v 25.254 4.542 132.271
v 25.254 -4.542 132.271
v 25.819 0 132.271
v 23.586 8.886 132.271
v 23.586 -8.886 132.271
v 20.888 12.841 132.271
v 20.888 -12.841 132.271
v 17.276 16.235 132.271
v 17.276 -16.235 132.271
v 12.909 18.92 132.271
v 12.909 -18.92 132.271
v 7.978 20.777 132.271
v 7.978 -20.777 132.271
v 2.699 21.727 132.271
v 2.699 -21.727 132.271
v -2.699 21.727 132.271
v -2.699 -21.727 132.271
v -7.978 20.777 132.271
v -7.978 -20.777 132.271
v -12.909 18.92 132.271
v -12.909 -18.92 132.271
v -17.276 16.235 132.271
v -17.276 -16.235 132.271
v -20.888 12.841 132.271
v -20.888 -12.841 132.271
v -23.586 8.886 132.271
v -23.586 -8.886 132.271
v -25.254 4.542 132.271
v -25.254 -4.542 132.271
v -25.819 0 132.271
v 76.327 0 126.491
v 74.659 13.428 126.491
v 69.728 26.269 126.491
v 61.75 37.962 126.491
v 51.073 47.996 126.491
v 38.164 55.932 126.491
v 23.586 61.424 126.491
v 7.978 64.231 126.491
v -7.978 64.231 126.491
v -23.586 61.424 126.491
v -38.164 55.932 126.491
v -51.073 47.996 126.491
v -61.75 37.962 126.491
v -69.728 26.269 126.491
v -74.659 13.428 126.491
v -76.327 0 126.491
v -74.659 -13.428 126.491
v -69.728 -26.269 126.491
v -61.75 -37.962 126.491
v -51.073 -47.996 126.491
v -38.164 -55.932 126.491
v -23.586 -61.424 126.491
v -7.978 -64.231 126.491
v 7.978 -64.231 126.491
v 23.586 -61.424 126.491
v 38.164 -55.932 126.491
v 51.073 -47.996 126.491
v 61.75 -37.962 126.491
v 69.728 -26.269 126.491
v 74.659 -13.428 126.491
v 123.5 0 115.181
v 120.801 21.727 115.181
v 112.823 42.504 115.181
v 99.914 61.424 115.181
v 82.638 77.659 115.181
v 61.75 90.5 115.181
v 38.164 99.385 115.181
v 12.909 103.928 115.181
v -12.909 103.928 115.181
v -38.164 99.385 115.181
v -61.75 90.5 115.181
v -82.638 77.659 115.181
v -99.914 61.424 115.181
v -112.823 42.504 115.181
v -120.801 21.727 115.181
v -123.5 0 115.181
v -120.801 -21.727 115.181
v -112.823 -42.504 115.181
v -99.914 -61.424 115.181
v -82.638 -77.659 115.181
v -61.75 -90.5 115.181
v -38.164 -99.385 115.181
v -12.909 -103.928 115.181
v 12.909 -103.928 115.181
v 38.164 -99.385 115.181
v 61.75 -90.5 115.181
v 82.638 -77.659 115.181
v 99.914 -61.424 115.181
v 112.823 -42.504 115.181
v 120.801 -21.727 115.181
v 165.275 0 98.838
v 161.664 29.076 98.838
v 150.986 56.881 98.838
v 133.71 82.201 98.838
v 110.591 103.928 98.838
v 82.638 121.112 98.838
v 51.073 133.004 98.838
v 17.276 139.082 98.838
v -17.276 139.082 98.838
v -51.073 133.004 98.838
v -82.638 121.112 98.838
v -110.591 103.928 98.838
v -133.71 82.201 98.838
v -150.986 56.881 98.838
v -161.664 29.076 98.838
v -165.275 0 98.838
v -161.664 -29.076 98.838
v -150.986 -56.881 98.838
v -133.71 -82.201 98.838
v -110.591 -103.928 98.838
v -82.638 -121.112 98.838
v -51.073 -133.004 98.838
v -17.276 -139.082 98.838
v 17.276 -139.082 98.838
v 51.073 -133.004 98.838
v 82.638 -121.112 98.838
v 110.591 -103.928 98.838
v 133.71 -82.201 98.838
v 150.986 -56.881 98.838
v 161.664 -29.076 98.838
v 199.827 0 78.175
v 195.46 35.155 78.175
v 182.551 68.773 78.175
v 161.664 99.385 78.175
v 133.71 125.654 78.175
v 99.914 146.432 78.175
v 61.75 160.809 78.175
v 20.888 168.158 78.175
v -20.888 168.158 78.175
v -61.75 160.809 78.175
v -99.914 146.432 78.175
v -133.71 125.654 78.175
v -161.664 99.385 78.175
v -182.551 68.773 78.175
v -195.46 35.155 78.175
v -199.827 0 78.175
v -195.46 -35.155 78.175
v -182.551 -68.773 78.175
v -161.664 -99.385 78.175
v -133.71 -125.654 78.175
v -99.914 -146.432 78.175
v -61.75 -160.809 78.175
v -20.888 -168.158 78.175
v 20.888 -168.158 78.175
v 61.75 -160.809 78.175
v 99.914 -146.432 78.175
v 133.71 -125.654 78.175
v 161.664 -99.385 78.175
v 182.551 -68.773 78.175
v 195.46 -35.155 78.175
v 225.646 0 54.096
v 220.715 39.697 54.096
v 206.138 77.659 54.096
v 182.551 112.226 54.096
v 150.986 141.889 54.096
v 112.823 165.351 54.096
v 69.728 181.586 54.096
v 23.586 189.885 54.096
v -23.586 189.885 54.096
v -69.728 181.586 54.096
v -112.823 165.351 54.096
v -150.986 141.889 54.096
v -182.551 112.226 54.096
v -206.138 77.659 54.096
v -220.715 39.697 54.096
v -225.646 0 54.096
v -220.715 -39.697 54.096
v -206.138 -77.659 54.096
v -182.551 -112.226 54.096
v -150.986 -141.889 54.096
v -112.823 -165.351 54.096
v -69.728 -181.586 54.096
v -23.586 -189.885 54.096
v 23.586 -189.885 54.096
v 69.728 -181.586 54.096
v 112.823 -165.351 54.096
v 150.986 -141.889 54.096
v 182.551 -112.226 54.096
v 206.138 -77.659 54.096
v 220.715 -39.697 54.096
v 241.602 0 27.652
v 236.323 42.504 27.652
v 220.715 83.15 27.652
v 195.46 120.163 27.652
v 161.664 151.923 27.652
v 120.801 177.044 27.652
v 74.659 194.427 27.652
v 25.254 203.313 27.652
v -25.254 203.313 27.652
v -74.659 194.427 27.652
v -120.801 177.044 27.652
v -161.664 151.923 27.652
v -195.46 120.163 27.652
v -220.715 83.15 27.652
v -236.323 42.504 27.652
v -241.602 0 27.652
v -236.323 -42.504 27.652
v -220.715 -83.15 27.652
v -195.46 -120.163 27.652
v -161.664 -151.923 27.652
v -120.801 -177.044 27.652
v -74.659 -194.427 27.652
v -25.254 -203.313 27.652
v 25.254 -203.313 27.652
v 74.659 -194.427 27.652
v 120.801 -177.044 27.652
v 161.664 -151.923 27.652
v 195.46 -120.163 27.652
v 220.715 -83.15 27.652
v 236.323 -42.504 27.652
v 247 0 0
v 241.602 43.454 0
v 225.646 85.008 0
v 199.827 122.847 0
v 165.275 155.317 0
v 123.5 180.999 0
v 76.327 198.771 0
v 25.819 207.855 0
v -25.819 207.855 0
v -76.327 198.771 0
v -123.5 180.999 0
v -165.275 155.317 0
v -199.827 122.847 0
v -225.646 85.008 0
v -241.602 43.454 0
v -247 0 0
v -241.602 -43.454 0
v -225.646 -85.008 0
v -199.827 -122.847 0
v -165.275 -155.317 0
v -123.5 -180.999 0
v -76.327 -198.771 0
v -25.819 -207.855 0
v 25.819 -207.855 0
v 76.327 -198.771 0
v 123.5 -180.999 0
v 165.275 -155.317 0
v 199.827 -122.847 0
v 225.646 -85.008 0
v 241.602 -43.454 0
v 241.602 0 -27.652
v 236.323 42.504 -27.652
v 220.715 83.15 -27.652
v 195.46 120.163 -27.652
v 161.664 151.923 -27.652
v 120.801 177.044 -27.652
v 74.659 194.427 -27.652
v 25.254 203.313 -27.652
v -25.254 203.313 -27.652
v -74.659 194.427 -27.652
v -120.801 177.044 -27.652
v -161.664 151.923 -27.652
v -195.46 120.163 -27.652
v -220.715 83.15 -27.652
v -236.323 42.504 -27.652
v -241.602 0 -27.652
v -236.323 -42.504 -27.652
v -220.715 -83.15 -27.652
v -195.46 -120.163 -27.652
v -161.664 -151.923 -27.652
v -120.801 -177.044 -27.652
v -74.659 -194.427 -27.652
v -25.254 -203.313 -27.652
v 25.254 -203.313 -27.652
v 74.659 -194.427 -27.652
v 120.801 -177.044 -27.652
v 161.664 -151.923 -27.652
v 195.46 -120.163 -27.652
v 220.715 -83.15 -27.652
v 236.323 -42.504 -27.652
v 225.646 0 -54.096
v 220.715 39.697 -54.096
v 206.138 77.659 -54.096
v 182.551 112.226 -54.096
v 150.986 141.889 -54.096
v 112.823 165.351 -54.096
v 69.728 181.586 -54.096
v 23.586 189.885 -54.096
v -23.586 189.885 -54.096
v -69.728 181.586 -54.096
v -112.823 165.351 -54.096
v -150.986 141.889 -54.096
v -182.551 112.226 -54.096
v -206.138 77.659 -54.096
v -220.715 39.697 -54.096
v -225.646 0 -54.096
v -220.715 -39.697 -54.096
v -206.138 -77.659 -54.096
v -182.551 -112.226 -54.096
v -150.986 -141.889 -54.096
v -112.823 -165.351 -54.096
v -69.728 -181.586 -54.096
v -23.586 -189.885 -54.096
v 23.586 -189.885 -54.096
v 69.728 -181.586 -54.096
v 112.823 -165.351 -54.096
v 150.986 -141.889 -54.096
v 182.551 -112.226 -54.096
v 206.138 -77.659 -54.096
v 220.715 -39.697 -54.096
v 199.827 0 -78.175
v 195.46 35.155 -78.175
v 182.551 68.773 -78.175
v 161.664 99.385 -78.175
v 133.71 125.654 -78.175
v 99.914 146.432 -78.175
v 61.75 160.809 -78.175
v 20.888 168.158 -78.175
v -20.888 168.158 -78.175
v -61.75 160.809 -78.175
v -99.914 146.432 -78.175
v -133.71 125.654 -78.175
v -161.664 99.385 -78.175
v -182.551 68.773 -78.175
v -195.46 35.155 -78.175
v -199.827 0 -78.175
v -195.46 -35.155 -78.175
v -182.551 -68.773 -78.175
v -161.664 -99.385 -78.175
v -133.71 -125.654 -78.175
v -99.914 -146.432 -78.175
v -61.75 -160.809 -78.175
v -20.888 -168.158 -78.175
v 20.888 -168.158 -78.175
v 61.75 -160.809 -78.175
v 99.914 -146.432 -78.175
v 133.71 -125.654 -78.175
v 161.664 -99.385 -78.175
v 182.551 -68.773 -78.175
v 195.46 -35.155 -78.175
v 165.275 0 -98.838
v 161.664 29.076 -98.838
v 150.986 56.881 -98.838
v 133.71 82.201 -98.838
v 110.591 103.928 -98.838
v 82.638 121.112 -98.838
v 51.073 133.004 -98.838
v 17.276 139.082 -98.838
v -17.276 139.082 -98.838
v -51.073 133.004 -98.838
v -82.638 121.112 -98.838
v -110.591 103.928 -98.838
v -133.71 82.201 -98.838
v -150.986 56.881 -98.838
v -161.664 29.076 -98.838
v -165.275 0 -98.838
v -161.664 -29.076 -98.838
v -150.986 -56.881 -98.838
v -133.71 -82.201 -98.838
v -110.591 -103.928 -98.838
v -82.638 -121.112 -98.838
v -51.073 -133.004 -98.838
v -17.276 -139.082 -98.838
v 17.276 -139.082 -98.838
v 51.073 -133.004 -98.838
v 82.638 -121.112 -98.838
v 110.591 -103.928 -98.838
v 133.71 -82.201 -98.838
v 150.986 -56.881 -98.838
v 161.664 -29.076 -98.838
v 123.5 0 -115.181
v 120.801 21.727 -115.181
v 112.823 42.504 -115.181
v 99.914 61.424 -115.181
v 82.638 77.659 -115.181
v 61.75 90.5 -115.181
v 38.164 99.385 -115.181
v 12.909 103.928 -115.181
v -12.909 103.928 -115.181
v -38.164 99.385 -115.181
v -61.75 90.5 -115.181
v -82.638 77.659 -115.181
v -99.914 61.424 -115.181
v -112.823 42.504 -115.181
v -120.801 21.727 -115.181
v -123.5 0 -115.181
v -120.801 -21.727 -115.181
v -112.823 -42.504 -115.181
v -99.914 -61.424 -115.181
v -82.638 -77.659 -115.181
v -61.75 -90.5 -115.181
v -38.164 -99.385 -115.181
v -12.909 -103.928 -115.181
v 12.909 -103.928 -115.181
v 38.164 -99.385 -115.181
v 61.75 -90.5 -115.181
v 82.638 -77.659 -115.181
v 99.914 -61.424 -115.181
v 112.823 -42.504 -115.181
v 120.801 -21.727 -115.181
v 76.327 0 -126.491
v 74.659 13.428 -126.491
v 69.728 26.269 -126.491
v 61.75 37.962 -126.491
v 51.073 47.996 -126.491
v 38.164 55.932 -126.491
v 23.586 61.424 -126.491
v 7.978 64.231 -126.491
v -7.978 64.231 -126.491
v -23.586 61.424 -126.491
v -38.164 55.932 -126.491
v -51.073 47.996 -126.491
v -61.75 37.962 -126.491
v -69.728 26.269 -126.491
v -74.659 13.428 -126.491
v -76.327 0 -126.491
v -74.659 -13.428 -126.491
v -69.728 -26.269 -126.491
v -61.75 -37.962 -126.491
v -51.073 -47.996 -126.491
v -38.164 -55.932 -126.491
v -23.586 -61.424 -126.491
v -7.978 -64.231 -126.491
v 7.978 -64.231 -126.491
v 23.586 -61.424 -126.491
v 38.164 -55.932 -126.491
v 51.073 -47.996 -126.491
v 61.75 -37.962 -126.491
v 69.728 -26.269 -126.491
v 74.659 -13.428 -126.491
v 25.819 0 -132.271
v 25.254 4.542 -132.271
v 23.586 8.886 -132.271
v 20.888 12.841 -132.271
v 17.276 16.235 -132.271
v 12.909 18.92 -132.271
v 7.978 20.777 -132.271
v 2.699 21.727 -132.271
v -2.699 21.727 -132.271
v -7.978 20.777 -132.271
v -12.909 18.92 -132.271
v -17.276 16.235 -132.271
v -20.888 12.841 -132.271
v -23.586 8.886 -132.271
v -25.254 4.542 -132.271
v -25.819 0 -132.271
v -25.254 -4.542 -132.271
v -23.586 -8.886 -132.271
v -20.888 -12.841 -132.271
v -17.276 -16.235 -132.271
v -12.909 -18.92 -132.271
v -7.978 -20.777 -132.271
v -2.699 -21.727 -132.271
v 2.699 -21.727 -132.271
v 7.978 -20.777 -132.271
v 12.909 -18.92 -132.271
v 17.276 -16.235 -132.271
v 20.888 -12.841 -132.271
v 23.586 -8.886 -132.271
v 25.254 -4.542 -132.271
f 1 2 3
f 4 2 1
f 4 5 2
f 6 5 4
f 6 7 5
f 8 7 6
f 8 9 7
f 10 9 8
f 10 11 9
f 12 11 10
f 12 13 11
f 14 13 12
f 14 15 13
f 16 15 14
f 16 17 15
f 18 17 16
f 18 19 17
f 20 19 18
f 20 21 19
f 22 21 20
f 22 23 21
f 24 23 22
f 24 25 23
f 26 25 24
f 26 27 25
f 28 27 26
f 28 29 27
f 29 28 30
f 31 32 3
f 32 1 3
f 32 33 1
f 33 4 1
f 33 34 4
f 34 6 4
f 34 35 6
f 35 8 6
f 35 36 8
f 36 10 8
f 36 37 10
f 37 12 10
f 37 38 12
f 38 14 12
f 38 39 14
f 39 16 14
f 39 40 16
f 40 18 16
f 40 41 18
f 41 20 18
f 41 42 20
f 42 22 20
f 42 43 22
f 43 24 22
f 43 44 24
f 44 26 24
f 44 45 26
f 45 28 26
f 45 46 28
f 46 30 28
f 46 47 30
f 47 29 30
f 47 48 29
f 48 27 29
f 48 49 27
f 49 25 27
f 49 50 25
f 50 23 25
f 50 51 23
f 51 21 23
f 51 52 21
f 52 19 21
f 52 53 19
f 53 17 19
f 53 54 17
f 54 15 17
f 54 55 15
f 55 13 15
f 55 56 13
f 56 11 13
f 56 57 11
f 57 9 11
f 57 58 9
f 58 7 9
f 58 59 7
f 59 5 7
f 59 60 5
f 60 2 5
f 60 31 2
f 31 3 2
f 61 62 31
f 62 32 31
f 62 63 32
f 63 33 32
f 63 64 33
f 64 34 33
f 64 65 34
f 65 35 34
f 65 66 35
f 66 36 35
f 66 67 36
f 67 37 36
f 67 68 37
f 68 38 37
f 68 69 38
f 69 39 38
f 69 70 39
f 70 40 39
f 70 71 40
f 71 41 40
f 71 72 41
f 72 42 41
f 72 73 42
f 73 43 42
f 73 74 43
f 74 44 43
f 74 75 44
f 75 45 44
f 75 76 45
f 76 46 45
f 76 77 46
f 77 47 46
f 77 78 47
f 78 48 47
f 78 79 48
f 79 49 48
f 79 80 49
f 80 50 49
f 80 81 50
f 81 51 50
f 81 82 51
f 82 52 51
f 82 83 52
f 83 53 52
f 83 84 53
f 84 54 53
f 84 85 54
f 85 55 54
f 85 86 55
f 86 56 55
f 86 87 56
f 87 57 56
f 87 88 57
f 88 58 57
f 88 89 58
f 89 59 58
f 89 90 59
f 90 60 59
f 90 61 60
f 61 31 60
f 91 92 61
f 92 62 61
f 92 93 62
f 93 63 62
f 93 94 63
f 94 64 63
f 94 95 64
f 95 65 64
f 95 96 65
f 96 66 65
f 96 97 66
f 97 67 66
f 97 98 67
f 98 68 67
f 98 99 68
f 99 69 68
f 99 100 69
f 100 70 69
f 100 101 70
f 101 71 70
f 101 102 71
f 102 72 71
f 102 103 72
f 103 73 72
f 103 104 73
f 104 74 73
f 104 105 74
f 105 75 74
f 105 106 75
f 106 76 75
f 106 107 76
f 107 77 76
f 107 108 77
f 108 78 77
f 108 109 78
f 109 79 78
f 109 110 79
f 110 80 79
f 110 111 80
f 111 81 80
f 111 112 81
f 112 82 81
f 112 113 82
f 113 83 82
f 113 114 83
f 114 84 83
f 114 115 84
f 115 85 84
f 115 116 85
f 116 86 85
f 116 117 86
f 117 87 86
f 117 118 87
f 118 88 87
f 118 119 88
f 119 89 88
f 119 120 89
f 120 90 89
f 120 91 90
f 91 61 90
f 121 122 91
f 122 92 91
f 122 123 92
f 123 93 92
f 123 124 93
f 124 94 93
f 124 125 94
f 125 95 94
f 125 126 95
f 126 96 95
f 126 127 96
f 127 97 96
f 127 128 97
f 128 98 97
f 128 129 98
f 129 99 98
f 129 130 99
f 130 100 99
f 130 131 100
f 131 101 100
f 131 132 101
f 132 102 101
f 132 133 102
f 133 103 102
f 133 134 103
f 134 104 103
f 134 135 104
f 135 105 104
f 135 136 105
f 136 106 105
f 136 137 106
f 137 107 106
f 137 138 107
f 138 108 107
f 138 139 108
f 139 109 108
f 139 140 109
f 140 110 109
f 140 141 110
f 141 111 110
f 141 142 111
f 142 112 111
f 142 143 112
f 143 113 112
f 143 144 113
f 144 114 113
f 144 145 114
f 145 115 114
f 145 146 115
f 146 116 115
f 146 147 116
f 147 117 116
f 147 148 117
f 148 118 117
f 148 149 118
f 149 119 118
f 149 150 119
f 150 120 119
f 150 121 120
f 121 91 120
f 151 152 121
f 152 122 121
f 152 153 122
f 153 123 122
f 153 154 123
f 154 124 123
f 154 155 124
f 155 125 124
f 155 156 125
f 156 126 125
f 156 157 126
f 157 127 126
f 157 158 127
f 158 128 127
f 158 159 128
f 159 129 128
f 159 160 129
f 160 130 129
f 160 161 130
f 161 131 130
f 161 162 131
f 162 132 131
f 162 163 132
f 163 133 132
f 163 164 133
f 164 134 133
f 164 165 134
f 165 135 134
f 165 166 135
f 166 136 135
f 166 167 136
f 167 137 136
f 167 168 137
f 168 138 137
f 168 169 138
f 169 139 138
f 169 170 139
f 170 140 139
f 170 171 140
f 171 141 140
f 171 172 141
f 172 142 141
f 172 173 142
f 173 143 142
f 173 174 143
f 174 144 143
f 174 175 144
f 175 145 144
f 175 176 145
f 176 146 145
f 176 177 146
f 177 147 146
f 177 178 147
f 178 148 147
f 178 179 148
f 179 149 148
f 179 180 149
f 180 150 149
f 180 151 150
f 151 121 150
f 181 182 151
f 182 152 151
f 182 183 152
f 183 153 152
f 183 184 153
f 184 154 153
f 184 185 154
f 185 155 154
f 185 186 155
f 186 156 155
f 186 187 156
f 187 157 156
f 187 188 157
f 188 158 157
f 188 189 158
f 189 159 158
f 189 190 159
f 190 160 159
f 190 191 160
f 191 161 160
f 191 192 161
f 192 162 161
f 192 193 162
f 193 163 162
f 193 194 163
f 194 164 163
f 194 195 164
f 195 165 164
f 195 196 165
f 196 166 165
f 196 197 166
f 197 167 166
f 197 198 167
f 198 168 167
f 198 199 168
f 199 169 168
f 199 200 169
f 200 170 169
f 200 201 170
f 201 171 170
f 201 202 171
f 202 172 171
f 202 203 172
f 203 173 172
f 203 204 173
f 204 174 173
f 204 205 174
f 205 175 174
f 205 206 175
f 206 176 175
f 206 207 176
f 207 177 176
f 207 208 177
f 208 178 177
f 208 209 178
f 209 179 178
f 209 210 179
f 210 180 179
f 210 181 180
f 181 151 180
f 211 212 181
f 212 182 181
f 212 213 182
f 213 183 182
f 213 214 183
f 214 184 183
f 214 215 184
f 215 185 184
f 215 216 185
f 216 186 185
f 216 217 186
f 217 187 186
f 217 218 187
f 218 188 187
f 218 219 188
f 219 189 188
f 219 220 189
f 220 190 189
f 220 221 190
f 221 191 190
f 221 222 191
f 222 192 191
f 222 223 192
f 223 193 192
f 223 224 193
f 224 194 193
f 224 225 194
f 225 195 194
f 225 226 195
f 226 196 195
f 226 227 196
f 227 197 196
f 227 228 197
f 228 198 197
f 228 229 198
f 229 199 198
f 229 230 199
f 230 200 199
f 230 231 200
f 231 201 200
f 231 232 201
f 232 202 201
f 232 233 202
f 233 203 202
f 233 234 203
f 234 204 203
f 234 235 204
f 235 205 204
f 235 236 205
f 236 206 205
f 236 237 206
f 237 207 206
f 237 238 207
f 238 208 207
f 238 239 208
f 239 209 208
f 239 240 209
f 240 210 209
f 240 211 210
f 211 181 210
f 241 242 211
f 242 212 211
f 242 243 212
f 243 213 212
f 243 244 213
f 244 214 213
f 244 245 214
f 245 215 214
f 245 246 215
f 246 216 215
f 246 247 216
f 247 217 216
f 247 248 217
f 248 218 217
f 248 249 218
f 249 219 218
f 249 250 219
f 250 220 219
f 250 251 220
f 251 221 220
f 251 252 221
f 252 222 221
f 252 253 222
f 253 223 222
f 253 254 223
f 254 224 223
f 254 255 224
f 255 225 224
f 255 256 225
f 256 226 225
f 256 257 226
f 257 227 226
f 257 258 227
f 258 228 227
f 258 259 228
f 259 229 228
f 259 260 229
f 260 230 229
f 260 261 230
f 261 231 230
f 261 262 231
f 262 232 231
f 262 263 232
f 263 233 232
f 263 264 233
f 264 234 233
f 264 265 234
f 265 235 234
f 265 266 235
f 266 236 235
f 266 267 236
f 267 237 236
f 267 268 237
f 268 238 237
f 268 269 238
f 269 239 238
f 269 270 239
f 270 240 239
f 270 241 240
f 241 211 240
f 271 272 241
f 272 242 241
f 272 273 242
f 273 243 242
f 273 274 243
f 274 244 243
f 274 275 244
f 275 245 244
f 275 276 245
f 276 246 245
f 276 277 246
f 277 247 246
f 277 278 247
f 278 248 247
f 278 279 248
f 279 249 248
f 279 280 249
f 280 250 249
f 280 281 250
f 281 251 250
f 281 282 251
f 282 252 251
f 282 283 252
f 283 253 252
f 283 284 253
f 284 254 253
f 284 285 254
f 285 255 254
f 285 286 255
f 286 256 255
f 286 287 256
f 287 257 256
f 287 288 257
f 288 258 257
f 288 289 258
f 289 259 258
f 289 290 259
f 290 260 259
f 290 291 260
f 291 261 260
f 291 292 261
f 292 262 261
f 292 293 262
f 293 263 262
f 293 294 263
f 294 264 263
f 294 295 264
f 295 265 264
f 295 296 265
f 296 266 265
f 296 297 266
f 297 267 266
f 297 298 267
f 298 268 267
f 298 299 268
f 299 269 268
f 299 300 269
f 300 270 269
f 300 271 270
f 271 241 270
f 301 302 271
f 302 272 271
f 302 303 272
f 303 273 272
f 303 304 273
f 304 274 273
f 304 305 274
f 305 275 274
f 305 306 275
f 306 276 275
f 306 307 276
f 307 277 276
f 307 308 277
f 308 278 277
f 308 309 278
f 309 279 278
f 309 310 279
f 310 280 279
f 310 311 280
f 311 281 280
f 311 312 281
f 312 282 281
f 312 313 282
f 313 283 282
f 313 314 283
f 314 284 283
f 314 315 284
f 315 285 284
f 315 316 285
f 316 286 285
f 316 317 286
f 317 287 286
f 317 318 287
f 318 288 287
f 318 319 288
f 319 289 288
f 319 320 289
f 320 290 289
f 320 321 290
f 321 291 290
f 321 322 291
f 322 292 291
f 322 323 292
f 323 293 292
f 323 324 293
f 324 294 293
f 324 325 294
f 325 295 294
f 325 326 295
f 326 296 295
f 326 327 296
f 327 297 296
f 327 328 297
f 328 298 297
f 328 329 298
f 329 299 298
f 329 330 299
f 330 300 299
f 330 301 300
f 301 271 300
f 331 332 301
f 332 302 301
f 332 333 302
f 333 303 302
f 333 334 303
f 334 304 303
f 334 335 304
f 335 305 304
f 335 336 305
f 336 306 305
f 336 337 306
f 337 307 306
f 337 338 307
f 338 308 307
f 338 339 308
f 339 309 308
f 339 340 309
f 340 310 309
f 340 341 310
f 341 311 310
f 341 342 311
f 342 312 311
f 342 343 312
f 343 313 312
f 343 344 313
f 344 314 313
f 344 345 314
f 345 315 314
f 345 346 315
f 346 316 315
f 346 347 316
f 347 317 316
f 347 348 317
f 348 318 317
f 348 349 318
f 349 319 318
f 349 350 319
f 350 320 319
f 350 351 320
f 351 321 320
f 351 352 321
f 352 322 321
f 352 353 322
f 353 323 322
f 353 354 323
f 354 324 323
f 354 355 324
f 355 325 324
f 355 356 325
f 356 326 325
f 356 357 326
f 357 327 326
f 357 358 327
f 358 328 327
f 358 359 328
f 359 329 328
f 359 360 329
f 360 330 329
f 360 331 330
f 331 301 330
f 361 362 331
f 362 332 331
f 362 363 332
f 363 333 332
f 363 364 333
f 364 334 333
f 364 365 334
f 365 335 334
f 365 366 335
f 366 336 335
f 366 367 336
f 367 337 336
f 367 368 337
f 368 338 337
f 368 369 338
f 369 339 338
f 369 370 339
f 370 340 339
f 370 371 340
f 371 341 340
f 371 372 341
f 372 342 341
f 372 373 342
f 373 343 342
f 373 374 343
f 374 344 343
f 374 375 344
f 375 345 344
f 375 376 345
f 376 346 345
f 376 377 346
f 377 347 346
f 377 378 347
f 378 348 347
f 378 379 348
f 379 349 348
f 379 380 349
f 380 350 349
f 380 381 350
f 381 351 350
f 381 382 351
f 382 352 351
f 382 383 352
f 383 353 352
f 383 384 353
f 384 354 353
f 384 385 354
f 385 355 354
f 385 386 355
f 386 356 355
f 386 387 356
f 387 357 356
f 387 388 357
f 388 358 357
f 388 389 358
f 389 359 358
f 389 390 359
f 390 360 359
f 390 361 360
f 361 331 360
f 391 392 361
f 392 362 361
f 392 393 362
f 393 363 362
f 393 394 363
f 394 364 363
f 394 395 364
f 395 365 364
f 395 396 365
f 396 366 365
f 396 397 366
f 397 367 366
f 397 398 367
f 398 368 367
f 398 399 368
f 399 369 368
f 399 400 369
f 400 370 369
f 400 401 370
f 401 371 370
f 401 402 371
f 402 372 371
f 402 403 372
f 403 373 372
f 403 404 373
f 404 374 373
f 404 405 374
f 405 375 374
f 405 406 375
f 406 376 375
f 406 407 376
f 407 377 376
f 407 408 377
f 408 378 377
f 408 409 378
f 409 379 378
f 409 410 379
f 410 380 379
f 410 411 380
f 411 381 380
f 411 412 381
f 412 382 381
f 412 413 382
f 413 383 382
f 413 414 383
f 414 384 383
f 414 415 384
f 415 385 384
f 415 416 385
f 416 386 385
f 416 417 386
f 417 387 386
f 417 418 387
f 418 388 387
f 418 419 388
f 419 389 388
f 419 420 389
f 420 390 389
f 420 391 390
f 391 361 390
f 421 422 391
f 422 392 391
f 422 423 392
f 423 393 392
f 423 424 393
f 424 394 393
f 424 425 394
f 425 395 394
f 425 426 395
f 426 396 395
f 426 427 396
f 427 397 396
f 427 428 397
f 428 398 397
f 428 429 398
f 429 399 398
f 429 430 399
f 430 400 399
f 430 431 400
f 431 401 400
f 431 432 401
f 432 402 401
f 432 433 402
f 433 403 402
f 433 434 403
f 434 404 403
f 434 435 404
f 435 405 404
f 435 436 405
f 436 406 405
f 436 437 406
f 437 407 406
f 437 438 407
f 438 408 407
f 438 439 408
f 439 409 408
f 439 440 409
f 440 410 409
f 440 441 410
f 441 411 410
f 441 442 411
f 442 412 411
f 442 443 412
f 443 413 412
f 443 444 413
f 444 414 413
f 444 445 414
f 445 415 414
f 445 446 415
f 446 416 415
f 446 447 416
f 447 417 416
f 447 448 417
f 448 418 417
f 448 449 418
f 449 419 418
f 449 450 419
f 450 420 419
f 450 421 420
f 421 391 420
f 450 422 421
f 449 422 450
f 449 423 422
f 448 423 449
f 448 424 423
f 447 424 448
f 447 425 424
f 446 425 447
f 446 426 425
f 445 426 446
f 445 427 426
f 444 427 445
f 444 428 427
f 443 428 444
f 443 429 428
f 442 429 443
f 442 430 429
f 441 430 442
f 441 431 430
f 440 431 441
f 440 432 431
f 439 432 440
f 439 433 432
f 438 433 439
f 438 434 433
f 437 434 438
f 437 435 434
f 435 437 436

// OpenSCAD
// Generated by SolidPython 1.0.1 on 2020-07-29 00:46:50


scale(v = [13, 11, 7]) {
	sphere(r = 19);
}
/***********************************************
*********      SolidPython code:      **********
************************************************
 
# import packages: SolidPython
from solid import *
from solid.utils import *
from itertools import chain, combinations, permutations


class Resize:

    def __init__(self, scad_file):
        self.scad_file = scad_file
        #self.scad_file = import_scad(scad_file)
        # cone/cylinder param:
        self.r1 = 0
        self.r2 = 0
        self.h = 0
        # rectangular prism param:
        self.w = 0
        self.l = 0
        # ellipse param:
        self.r = 0

    # import OpenScad code (file name corresponds to shape)


    # classify shape + parameters
    def assign(self, param1, param2, param3):
        if self.scad_file == 'cone.scad':
            self.r1 = param1
            self.r2 = param2
            self.h = param3
        elif self.scad_file == 'cylinder.scad':
            self.r1 = param1
            self.r2 = param2
            self.h = param3
        elif self.scad_file == 'rectangularPrism.scad':
            self.h = param1
            self.l = param2
            self.w = param3
        else:
            self.r = param1
            self.h = param2

    # resize parameters
    def iterate(self):
        x = range(3, 20, 2)
        i = 1
        if self.scad_file == 'cone.scad':
            tempList = list(permutations(x, 2))
            for temp in tempList:
                param1 = temp[0]
                param2 = temp[1]
                filepath = 'produced_scad_files/' + 'cone' + str(param1) + '_' + str(param2) + '_' + '.scad'
                scad_render_to_file(cylinder(h=param1, r1=param2, r2=0), filepath)

        elif self.scad_file == 'cylinder.scad':
            tempList = list(permutations(x, 3))
            for temp in tempList:
                param1 = temp[0]
                param2 = temp[1]
                filepath = 'produced_scad_files/' + 'cylinder' + str(param1) + '_' + str(param2) + '_' + '.scad'
                scad_render_to_file(cylinder(h=param1, r1=param2, r2=param2), filepath)

        elif self.scad_file == 'rectangularPrism.scad':
            tempList = list(permutations(x, 3))
            for temp in tempList:
                param1 = temp[0]
                param2 = temp[1]
                param3 = temp[2]
                filepath = 'produced_scad_files/' + 'rectangularPrism' + str(param1) + '_' + str(param2) + '_' + str(
                    param3) + '.scad'
                scad_render_to_file(cube(size=(param1, param2, param3)), filepath)

        elif self.scad_file == 'ellipse.scad':
            tempList = list(permutations(x, 4))
            for temp in tempList:
                param1 = temp[0]
                param2 = temp[1]
                param3 = temp[2]
                param4 = temp[3]
                filepath = 'produced_scad_files/' + 'ellipse' + str(param1) + '_' + str(param2) + '_' + str(param3) + '_' + str(param4) + '.scad'
                scad_render_to_file(scale([param1, param2, param3])(sphere(r=param4)), filepath)

    def render_to_scadfile(self):
        scad_render_to_file(scad, 'example.scad') 
 
************************************************/
